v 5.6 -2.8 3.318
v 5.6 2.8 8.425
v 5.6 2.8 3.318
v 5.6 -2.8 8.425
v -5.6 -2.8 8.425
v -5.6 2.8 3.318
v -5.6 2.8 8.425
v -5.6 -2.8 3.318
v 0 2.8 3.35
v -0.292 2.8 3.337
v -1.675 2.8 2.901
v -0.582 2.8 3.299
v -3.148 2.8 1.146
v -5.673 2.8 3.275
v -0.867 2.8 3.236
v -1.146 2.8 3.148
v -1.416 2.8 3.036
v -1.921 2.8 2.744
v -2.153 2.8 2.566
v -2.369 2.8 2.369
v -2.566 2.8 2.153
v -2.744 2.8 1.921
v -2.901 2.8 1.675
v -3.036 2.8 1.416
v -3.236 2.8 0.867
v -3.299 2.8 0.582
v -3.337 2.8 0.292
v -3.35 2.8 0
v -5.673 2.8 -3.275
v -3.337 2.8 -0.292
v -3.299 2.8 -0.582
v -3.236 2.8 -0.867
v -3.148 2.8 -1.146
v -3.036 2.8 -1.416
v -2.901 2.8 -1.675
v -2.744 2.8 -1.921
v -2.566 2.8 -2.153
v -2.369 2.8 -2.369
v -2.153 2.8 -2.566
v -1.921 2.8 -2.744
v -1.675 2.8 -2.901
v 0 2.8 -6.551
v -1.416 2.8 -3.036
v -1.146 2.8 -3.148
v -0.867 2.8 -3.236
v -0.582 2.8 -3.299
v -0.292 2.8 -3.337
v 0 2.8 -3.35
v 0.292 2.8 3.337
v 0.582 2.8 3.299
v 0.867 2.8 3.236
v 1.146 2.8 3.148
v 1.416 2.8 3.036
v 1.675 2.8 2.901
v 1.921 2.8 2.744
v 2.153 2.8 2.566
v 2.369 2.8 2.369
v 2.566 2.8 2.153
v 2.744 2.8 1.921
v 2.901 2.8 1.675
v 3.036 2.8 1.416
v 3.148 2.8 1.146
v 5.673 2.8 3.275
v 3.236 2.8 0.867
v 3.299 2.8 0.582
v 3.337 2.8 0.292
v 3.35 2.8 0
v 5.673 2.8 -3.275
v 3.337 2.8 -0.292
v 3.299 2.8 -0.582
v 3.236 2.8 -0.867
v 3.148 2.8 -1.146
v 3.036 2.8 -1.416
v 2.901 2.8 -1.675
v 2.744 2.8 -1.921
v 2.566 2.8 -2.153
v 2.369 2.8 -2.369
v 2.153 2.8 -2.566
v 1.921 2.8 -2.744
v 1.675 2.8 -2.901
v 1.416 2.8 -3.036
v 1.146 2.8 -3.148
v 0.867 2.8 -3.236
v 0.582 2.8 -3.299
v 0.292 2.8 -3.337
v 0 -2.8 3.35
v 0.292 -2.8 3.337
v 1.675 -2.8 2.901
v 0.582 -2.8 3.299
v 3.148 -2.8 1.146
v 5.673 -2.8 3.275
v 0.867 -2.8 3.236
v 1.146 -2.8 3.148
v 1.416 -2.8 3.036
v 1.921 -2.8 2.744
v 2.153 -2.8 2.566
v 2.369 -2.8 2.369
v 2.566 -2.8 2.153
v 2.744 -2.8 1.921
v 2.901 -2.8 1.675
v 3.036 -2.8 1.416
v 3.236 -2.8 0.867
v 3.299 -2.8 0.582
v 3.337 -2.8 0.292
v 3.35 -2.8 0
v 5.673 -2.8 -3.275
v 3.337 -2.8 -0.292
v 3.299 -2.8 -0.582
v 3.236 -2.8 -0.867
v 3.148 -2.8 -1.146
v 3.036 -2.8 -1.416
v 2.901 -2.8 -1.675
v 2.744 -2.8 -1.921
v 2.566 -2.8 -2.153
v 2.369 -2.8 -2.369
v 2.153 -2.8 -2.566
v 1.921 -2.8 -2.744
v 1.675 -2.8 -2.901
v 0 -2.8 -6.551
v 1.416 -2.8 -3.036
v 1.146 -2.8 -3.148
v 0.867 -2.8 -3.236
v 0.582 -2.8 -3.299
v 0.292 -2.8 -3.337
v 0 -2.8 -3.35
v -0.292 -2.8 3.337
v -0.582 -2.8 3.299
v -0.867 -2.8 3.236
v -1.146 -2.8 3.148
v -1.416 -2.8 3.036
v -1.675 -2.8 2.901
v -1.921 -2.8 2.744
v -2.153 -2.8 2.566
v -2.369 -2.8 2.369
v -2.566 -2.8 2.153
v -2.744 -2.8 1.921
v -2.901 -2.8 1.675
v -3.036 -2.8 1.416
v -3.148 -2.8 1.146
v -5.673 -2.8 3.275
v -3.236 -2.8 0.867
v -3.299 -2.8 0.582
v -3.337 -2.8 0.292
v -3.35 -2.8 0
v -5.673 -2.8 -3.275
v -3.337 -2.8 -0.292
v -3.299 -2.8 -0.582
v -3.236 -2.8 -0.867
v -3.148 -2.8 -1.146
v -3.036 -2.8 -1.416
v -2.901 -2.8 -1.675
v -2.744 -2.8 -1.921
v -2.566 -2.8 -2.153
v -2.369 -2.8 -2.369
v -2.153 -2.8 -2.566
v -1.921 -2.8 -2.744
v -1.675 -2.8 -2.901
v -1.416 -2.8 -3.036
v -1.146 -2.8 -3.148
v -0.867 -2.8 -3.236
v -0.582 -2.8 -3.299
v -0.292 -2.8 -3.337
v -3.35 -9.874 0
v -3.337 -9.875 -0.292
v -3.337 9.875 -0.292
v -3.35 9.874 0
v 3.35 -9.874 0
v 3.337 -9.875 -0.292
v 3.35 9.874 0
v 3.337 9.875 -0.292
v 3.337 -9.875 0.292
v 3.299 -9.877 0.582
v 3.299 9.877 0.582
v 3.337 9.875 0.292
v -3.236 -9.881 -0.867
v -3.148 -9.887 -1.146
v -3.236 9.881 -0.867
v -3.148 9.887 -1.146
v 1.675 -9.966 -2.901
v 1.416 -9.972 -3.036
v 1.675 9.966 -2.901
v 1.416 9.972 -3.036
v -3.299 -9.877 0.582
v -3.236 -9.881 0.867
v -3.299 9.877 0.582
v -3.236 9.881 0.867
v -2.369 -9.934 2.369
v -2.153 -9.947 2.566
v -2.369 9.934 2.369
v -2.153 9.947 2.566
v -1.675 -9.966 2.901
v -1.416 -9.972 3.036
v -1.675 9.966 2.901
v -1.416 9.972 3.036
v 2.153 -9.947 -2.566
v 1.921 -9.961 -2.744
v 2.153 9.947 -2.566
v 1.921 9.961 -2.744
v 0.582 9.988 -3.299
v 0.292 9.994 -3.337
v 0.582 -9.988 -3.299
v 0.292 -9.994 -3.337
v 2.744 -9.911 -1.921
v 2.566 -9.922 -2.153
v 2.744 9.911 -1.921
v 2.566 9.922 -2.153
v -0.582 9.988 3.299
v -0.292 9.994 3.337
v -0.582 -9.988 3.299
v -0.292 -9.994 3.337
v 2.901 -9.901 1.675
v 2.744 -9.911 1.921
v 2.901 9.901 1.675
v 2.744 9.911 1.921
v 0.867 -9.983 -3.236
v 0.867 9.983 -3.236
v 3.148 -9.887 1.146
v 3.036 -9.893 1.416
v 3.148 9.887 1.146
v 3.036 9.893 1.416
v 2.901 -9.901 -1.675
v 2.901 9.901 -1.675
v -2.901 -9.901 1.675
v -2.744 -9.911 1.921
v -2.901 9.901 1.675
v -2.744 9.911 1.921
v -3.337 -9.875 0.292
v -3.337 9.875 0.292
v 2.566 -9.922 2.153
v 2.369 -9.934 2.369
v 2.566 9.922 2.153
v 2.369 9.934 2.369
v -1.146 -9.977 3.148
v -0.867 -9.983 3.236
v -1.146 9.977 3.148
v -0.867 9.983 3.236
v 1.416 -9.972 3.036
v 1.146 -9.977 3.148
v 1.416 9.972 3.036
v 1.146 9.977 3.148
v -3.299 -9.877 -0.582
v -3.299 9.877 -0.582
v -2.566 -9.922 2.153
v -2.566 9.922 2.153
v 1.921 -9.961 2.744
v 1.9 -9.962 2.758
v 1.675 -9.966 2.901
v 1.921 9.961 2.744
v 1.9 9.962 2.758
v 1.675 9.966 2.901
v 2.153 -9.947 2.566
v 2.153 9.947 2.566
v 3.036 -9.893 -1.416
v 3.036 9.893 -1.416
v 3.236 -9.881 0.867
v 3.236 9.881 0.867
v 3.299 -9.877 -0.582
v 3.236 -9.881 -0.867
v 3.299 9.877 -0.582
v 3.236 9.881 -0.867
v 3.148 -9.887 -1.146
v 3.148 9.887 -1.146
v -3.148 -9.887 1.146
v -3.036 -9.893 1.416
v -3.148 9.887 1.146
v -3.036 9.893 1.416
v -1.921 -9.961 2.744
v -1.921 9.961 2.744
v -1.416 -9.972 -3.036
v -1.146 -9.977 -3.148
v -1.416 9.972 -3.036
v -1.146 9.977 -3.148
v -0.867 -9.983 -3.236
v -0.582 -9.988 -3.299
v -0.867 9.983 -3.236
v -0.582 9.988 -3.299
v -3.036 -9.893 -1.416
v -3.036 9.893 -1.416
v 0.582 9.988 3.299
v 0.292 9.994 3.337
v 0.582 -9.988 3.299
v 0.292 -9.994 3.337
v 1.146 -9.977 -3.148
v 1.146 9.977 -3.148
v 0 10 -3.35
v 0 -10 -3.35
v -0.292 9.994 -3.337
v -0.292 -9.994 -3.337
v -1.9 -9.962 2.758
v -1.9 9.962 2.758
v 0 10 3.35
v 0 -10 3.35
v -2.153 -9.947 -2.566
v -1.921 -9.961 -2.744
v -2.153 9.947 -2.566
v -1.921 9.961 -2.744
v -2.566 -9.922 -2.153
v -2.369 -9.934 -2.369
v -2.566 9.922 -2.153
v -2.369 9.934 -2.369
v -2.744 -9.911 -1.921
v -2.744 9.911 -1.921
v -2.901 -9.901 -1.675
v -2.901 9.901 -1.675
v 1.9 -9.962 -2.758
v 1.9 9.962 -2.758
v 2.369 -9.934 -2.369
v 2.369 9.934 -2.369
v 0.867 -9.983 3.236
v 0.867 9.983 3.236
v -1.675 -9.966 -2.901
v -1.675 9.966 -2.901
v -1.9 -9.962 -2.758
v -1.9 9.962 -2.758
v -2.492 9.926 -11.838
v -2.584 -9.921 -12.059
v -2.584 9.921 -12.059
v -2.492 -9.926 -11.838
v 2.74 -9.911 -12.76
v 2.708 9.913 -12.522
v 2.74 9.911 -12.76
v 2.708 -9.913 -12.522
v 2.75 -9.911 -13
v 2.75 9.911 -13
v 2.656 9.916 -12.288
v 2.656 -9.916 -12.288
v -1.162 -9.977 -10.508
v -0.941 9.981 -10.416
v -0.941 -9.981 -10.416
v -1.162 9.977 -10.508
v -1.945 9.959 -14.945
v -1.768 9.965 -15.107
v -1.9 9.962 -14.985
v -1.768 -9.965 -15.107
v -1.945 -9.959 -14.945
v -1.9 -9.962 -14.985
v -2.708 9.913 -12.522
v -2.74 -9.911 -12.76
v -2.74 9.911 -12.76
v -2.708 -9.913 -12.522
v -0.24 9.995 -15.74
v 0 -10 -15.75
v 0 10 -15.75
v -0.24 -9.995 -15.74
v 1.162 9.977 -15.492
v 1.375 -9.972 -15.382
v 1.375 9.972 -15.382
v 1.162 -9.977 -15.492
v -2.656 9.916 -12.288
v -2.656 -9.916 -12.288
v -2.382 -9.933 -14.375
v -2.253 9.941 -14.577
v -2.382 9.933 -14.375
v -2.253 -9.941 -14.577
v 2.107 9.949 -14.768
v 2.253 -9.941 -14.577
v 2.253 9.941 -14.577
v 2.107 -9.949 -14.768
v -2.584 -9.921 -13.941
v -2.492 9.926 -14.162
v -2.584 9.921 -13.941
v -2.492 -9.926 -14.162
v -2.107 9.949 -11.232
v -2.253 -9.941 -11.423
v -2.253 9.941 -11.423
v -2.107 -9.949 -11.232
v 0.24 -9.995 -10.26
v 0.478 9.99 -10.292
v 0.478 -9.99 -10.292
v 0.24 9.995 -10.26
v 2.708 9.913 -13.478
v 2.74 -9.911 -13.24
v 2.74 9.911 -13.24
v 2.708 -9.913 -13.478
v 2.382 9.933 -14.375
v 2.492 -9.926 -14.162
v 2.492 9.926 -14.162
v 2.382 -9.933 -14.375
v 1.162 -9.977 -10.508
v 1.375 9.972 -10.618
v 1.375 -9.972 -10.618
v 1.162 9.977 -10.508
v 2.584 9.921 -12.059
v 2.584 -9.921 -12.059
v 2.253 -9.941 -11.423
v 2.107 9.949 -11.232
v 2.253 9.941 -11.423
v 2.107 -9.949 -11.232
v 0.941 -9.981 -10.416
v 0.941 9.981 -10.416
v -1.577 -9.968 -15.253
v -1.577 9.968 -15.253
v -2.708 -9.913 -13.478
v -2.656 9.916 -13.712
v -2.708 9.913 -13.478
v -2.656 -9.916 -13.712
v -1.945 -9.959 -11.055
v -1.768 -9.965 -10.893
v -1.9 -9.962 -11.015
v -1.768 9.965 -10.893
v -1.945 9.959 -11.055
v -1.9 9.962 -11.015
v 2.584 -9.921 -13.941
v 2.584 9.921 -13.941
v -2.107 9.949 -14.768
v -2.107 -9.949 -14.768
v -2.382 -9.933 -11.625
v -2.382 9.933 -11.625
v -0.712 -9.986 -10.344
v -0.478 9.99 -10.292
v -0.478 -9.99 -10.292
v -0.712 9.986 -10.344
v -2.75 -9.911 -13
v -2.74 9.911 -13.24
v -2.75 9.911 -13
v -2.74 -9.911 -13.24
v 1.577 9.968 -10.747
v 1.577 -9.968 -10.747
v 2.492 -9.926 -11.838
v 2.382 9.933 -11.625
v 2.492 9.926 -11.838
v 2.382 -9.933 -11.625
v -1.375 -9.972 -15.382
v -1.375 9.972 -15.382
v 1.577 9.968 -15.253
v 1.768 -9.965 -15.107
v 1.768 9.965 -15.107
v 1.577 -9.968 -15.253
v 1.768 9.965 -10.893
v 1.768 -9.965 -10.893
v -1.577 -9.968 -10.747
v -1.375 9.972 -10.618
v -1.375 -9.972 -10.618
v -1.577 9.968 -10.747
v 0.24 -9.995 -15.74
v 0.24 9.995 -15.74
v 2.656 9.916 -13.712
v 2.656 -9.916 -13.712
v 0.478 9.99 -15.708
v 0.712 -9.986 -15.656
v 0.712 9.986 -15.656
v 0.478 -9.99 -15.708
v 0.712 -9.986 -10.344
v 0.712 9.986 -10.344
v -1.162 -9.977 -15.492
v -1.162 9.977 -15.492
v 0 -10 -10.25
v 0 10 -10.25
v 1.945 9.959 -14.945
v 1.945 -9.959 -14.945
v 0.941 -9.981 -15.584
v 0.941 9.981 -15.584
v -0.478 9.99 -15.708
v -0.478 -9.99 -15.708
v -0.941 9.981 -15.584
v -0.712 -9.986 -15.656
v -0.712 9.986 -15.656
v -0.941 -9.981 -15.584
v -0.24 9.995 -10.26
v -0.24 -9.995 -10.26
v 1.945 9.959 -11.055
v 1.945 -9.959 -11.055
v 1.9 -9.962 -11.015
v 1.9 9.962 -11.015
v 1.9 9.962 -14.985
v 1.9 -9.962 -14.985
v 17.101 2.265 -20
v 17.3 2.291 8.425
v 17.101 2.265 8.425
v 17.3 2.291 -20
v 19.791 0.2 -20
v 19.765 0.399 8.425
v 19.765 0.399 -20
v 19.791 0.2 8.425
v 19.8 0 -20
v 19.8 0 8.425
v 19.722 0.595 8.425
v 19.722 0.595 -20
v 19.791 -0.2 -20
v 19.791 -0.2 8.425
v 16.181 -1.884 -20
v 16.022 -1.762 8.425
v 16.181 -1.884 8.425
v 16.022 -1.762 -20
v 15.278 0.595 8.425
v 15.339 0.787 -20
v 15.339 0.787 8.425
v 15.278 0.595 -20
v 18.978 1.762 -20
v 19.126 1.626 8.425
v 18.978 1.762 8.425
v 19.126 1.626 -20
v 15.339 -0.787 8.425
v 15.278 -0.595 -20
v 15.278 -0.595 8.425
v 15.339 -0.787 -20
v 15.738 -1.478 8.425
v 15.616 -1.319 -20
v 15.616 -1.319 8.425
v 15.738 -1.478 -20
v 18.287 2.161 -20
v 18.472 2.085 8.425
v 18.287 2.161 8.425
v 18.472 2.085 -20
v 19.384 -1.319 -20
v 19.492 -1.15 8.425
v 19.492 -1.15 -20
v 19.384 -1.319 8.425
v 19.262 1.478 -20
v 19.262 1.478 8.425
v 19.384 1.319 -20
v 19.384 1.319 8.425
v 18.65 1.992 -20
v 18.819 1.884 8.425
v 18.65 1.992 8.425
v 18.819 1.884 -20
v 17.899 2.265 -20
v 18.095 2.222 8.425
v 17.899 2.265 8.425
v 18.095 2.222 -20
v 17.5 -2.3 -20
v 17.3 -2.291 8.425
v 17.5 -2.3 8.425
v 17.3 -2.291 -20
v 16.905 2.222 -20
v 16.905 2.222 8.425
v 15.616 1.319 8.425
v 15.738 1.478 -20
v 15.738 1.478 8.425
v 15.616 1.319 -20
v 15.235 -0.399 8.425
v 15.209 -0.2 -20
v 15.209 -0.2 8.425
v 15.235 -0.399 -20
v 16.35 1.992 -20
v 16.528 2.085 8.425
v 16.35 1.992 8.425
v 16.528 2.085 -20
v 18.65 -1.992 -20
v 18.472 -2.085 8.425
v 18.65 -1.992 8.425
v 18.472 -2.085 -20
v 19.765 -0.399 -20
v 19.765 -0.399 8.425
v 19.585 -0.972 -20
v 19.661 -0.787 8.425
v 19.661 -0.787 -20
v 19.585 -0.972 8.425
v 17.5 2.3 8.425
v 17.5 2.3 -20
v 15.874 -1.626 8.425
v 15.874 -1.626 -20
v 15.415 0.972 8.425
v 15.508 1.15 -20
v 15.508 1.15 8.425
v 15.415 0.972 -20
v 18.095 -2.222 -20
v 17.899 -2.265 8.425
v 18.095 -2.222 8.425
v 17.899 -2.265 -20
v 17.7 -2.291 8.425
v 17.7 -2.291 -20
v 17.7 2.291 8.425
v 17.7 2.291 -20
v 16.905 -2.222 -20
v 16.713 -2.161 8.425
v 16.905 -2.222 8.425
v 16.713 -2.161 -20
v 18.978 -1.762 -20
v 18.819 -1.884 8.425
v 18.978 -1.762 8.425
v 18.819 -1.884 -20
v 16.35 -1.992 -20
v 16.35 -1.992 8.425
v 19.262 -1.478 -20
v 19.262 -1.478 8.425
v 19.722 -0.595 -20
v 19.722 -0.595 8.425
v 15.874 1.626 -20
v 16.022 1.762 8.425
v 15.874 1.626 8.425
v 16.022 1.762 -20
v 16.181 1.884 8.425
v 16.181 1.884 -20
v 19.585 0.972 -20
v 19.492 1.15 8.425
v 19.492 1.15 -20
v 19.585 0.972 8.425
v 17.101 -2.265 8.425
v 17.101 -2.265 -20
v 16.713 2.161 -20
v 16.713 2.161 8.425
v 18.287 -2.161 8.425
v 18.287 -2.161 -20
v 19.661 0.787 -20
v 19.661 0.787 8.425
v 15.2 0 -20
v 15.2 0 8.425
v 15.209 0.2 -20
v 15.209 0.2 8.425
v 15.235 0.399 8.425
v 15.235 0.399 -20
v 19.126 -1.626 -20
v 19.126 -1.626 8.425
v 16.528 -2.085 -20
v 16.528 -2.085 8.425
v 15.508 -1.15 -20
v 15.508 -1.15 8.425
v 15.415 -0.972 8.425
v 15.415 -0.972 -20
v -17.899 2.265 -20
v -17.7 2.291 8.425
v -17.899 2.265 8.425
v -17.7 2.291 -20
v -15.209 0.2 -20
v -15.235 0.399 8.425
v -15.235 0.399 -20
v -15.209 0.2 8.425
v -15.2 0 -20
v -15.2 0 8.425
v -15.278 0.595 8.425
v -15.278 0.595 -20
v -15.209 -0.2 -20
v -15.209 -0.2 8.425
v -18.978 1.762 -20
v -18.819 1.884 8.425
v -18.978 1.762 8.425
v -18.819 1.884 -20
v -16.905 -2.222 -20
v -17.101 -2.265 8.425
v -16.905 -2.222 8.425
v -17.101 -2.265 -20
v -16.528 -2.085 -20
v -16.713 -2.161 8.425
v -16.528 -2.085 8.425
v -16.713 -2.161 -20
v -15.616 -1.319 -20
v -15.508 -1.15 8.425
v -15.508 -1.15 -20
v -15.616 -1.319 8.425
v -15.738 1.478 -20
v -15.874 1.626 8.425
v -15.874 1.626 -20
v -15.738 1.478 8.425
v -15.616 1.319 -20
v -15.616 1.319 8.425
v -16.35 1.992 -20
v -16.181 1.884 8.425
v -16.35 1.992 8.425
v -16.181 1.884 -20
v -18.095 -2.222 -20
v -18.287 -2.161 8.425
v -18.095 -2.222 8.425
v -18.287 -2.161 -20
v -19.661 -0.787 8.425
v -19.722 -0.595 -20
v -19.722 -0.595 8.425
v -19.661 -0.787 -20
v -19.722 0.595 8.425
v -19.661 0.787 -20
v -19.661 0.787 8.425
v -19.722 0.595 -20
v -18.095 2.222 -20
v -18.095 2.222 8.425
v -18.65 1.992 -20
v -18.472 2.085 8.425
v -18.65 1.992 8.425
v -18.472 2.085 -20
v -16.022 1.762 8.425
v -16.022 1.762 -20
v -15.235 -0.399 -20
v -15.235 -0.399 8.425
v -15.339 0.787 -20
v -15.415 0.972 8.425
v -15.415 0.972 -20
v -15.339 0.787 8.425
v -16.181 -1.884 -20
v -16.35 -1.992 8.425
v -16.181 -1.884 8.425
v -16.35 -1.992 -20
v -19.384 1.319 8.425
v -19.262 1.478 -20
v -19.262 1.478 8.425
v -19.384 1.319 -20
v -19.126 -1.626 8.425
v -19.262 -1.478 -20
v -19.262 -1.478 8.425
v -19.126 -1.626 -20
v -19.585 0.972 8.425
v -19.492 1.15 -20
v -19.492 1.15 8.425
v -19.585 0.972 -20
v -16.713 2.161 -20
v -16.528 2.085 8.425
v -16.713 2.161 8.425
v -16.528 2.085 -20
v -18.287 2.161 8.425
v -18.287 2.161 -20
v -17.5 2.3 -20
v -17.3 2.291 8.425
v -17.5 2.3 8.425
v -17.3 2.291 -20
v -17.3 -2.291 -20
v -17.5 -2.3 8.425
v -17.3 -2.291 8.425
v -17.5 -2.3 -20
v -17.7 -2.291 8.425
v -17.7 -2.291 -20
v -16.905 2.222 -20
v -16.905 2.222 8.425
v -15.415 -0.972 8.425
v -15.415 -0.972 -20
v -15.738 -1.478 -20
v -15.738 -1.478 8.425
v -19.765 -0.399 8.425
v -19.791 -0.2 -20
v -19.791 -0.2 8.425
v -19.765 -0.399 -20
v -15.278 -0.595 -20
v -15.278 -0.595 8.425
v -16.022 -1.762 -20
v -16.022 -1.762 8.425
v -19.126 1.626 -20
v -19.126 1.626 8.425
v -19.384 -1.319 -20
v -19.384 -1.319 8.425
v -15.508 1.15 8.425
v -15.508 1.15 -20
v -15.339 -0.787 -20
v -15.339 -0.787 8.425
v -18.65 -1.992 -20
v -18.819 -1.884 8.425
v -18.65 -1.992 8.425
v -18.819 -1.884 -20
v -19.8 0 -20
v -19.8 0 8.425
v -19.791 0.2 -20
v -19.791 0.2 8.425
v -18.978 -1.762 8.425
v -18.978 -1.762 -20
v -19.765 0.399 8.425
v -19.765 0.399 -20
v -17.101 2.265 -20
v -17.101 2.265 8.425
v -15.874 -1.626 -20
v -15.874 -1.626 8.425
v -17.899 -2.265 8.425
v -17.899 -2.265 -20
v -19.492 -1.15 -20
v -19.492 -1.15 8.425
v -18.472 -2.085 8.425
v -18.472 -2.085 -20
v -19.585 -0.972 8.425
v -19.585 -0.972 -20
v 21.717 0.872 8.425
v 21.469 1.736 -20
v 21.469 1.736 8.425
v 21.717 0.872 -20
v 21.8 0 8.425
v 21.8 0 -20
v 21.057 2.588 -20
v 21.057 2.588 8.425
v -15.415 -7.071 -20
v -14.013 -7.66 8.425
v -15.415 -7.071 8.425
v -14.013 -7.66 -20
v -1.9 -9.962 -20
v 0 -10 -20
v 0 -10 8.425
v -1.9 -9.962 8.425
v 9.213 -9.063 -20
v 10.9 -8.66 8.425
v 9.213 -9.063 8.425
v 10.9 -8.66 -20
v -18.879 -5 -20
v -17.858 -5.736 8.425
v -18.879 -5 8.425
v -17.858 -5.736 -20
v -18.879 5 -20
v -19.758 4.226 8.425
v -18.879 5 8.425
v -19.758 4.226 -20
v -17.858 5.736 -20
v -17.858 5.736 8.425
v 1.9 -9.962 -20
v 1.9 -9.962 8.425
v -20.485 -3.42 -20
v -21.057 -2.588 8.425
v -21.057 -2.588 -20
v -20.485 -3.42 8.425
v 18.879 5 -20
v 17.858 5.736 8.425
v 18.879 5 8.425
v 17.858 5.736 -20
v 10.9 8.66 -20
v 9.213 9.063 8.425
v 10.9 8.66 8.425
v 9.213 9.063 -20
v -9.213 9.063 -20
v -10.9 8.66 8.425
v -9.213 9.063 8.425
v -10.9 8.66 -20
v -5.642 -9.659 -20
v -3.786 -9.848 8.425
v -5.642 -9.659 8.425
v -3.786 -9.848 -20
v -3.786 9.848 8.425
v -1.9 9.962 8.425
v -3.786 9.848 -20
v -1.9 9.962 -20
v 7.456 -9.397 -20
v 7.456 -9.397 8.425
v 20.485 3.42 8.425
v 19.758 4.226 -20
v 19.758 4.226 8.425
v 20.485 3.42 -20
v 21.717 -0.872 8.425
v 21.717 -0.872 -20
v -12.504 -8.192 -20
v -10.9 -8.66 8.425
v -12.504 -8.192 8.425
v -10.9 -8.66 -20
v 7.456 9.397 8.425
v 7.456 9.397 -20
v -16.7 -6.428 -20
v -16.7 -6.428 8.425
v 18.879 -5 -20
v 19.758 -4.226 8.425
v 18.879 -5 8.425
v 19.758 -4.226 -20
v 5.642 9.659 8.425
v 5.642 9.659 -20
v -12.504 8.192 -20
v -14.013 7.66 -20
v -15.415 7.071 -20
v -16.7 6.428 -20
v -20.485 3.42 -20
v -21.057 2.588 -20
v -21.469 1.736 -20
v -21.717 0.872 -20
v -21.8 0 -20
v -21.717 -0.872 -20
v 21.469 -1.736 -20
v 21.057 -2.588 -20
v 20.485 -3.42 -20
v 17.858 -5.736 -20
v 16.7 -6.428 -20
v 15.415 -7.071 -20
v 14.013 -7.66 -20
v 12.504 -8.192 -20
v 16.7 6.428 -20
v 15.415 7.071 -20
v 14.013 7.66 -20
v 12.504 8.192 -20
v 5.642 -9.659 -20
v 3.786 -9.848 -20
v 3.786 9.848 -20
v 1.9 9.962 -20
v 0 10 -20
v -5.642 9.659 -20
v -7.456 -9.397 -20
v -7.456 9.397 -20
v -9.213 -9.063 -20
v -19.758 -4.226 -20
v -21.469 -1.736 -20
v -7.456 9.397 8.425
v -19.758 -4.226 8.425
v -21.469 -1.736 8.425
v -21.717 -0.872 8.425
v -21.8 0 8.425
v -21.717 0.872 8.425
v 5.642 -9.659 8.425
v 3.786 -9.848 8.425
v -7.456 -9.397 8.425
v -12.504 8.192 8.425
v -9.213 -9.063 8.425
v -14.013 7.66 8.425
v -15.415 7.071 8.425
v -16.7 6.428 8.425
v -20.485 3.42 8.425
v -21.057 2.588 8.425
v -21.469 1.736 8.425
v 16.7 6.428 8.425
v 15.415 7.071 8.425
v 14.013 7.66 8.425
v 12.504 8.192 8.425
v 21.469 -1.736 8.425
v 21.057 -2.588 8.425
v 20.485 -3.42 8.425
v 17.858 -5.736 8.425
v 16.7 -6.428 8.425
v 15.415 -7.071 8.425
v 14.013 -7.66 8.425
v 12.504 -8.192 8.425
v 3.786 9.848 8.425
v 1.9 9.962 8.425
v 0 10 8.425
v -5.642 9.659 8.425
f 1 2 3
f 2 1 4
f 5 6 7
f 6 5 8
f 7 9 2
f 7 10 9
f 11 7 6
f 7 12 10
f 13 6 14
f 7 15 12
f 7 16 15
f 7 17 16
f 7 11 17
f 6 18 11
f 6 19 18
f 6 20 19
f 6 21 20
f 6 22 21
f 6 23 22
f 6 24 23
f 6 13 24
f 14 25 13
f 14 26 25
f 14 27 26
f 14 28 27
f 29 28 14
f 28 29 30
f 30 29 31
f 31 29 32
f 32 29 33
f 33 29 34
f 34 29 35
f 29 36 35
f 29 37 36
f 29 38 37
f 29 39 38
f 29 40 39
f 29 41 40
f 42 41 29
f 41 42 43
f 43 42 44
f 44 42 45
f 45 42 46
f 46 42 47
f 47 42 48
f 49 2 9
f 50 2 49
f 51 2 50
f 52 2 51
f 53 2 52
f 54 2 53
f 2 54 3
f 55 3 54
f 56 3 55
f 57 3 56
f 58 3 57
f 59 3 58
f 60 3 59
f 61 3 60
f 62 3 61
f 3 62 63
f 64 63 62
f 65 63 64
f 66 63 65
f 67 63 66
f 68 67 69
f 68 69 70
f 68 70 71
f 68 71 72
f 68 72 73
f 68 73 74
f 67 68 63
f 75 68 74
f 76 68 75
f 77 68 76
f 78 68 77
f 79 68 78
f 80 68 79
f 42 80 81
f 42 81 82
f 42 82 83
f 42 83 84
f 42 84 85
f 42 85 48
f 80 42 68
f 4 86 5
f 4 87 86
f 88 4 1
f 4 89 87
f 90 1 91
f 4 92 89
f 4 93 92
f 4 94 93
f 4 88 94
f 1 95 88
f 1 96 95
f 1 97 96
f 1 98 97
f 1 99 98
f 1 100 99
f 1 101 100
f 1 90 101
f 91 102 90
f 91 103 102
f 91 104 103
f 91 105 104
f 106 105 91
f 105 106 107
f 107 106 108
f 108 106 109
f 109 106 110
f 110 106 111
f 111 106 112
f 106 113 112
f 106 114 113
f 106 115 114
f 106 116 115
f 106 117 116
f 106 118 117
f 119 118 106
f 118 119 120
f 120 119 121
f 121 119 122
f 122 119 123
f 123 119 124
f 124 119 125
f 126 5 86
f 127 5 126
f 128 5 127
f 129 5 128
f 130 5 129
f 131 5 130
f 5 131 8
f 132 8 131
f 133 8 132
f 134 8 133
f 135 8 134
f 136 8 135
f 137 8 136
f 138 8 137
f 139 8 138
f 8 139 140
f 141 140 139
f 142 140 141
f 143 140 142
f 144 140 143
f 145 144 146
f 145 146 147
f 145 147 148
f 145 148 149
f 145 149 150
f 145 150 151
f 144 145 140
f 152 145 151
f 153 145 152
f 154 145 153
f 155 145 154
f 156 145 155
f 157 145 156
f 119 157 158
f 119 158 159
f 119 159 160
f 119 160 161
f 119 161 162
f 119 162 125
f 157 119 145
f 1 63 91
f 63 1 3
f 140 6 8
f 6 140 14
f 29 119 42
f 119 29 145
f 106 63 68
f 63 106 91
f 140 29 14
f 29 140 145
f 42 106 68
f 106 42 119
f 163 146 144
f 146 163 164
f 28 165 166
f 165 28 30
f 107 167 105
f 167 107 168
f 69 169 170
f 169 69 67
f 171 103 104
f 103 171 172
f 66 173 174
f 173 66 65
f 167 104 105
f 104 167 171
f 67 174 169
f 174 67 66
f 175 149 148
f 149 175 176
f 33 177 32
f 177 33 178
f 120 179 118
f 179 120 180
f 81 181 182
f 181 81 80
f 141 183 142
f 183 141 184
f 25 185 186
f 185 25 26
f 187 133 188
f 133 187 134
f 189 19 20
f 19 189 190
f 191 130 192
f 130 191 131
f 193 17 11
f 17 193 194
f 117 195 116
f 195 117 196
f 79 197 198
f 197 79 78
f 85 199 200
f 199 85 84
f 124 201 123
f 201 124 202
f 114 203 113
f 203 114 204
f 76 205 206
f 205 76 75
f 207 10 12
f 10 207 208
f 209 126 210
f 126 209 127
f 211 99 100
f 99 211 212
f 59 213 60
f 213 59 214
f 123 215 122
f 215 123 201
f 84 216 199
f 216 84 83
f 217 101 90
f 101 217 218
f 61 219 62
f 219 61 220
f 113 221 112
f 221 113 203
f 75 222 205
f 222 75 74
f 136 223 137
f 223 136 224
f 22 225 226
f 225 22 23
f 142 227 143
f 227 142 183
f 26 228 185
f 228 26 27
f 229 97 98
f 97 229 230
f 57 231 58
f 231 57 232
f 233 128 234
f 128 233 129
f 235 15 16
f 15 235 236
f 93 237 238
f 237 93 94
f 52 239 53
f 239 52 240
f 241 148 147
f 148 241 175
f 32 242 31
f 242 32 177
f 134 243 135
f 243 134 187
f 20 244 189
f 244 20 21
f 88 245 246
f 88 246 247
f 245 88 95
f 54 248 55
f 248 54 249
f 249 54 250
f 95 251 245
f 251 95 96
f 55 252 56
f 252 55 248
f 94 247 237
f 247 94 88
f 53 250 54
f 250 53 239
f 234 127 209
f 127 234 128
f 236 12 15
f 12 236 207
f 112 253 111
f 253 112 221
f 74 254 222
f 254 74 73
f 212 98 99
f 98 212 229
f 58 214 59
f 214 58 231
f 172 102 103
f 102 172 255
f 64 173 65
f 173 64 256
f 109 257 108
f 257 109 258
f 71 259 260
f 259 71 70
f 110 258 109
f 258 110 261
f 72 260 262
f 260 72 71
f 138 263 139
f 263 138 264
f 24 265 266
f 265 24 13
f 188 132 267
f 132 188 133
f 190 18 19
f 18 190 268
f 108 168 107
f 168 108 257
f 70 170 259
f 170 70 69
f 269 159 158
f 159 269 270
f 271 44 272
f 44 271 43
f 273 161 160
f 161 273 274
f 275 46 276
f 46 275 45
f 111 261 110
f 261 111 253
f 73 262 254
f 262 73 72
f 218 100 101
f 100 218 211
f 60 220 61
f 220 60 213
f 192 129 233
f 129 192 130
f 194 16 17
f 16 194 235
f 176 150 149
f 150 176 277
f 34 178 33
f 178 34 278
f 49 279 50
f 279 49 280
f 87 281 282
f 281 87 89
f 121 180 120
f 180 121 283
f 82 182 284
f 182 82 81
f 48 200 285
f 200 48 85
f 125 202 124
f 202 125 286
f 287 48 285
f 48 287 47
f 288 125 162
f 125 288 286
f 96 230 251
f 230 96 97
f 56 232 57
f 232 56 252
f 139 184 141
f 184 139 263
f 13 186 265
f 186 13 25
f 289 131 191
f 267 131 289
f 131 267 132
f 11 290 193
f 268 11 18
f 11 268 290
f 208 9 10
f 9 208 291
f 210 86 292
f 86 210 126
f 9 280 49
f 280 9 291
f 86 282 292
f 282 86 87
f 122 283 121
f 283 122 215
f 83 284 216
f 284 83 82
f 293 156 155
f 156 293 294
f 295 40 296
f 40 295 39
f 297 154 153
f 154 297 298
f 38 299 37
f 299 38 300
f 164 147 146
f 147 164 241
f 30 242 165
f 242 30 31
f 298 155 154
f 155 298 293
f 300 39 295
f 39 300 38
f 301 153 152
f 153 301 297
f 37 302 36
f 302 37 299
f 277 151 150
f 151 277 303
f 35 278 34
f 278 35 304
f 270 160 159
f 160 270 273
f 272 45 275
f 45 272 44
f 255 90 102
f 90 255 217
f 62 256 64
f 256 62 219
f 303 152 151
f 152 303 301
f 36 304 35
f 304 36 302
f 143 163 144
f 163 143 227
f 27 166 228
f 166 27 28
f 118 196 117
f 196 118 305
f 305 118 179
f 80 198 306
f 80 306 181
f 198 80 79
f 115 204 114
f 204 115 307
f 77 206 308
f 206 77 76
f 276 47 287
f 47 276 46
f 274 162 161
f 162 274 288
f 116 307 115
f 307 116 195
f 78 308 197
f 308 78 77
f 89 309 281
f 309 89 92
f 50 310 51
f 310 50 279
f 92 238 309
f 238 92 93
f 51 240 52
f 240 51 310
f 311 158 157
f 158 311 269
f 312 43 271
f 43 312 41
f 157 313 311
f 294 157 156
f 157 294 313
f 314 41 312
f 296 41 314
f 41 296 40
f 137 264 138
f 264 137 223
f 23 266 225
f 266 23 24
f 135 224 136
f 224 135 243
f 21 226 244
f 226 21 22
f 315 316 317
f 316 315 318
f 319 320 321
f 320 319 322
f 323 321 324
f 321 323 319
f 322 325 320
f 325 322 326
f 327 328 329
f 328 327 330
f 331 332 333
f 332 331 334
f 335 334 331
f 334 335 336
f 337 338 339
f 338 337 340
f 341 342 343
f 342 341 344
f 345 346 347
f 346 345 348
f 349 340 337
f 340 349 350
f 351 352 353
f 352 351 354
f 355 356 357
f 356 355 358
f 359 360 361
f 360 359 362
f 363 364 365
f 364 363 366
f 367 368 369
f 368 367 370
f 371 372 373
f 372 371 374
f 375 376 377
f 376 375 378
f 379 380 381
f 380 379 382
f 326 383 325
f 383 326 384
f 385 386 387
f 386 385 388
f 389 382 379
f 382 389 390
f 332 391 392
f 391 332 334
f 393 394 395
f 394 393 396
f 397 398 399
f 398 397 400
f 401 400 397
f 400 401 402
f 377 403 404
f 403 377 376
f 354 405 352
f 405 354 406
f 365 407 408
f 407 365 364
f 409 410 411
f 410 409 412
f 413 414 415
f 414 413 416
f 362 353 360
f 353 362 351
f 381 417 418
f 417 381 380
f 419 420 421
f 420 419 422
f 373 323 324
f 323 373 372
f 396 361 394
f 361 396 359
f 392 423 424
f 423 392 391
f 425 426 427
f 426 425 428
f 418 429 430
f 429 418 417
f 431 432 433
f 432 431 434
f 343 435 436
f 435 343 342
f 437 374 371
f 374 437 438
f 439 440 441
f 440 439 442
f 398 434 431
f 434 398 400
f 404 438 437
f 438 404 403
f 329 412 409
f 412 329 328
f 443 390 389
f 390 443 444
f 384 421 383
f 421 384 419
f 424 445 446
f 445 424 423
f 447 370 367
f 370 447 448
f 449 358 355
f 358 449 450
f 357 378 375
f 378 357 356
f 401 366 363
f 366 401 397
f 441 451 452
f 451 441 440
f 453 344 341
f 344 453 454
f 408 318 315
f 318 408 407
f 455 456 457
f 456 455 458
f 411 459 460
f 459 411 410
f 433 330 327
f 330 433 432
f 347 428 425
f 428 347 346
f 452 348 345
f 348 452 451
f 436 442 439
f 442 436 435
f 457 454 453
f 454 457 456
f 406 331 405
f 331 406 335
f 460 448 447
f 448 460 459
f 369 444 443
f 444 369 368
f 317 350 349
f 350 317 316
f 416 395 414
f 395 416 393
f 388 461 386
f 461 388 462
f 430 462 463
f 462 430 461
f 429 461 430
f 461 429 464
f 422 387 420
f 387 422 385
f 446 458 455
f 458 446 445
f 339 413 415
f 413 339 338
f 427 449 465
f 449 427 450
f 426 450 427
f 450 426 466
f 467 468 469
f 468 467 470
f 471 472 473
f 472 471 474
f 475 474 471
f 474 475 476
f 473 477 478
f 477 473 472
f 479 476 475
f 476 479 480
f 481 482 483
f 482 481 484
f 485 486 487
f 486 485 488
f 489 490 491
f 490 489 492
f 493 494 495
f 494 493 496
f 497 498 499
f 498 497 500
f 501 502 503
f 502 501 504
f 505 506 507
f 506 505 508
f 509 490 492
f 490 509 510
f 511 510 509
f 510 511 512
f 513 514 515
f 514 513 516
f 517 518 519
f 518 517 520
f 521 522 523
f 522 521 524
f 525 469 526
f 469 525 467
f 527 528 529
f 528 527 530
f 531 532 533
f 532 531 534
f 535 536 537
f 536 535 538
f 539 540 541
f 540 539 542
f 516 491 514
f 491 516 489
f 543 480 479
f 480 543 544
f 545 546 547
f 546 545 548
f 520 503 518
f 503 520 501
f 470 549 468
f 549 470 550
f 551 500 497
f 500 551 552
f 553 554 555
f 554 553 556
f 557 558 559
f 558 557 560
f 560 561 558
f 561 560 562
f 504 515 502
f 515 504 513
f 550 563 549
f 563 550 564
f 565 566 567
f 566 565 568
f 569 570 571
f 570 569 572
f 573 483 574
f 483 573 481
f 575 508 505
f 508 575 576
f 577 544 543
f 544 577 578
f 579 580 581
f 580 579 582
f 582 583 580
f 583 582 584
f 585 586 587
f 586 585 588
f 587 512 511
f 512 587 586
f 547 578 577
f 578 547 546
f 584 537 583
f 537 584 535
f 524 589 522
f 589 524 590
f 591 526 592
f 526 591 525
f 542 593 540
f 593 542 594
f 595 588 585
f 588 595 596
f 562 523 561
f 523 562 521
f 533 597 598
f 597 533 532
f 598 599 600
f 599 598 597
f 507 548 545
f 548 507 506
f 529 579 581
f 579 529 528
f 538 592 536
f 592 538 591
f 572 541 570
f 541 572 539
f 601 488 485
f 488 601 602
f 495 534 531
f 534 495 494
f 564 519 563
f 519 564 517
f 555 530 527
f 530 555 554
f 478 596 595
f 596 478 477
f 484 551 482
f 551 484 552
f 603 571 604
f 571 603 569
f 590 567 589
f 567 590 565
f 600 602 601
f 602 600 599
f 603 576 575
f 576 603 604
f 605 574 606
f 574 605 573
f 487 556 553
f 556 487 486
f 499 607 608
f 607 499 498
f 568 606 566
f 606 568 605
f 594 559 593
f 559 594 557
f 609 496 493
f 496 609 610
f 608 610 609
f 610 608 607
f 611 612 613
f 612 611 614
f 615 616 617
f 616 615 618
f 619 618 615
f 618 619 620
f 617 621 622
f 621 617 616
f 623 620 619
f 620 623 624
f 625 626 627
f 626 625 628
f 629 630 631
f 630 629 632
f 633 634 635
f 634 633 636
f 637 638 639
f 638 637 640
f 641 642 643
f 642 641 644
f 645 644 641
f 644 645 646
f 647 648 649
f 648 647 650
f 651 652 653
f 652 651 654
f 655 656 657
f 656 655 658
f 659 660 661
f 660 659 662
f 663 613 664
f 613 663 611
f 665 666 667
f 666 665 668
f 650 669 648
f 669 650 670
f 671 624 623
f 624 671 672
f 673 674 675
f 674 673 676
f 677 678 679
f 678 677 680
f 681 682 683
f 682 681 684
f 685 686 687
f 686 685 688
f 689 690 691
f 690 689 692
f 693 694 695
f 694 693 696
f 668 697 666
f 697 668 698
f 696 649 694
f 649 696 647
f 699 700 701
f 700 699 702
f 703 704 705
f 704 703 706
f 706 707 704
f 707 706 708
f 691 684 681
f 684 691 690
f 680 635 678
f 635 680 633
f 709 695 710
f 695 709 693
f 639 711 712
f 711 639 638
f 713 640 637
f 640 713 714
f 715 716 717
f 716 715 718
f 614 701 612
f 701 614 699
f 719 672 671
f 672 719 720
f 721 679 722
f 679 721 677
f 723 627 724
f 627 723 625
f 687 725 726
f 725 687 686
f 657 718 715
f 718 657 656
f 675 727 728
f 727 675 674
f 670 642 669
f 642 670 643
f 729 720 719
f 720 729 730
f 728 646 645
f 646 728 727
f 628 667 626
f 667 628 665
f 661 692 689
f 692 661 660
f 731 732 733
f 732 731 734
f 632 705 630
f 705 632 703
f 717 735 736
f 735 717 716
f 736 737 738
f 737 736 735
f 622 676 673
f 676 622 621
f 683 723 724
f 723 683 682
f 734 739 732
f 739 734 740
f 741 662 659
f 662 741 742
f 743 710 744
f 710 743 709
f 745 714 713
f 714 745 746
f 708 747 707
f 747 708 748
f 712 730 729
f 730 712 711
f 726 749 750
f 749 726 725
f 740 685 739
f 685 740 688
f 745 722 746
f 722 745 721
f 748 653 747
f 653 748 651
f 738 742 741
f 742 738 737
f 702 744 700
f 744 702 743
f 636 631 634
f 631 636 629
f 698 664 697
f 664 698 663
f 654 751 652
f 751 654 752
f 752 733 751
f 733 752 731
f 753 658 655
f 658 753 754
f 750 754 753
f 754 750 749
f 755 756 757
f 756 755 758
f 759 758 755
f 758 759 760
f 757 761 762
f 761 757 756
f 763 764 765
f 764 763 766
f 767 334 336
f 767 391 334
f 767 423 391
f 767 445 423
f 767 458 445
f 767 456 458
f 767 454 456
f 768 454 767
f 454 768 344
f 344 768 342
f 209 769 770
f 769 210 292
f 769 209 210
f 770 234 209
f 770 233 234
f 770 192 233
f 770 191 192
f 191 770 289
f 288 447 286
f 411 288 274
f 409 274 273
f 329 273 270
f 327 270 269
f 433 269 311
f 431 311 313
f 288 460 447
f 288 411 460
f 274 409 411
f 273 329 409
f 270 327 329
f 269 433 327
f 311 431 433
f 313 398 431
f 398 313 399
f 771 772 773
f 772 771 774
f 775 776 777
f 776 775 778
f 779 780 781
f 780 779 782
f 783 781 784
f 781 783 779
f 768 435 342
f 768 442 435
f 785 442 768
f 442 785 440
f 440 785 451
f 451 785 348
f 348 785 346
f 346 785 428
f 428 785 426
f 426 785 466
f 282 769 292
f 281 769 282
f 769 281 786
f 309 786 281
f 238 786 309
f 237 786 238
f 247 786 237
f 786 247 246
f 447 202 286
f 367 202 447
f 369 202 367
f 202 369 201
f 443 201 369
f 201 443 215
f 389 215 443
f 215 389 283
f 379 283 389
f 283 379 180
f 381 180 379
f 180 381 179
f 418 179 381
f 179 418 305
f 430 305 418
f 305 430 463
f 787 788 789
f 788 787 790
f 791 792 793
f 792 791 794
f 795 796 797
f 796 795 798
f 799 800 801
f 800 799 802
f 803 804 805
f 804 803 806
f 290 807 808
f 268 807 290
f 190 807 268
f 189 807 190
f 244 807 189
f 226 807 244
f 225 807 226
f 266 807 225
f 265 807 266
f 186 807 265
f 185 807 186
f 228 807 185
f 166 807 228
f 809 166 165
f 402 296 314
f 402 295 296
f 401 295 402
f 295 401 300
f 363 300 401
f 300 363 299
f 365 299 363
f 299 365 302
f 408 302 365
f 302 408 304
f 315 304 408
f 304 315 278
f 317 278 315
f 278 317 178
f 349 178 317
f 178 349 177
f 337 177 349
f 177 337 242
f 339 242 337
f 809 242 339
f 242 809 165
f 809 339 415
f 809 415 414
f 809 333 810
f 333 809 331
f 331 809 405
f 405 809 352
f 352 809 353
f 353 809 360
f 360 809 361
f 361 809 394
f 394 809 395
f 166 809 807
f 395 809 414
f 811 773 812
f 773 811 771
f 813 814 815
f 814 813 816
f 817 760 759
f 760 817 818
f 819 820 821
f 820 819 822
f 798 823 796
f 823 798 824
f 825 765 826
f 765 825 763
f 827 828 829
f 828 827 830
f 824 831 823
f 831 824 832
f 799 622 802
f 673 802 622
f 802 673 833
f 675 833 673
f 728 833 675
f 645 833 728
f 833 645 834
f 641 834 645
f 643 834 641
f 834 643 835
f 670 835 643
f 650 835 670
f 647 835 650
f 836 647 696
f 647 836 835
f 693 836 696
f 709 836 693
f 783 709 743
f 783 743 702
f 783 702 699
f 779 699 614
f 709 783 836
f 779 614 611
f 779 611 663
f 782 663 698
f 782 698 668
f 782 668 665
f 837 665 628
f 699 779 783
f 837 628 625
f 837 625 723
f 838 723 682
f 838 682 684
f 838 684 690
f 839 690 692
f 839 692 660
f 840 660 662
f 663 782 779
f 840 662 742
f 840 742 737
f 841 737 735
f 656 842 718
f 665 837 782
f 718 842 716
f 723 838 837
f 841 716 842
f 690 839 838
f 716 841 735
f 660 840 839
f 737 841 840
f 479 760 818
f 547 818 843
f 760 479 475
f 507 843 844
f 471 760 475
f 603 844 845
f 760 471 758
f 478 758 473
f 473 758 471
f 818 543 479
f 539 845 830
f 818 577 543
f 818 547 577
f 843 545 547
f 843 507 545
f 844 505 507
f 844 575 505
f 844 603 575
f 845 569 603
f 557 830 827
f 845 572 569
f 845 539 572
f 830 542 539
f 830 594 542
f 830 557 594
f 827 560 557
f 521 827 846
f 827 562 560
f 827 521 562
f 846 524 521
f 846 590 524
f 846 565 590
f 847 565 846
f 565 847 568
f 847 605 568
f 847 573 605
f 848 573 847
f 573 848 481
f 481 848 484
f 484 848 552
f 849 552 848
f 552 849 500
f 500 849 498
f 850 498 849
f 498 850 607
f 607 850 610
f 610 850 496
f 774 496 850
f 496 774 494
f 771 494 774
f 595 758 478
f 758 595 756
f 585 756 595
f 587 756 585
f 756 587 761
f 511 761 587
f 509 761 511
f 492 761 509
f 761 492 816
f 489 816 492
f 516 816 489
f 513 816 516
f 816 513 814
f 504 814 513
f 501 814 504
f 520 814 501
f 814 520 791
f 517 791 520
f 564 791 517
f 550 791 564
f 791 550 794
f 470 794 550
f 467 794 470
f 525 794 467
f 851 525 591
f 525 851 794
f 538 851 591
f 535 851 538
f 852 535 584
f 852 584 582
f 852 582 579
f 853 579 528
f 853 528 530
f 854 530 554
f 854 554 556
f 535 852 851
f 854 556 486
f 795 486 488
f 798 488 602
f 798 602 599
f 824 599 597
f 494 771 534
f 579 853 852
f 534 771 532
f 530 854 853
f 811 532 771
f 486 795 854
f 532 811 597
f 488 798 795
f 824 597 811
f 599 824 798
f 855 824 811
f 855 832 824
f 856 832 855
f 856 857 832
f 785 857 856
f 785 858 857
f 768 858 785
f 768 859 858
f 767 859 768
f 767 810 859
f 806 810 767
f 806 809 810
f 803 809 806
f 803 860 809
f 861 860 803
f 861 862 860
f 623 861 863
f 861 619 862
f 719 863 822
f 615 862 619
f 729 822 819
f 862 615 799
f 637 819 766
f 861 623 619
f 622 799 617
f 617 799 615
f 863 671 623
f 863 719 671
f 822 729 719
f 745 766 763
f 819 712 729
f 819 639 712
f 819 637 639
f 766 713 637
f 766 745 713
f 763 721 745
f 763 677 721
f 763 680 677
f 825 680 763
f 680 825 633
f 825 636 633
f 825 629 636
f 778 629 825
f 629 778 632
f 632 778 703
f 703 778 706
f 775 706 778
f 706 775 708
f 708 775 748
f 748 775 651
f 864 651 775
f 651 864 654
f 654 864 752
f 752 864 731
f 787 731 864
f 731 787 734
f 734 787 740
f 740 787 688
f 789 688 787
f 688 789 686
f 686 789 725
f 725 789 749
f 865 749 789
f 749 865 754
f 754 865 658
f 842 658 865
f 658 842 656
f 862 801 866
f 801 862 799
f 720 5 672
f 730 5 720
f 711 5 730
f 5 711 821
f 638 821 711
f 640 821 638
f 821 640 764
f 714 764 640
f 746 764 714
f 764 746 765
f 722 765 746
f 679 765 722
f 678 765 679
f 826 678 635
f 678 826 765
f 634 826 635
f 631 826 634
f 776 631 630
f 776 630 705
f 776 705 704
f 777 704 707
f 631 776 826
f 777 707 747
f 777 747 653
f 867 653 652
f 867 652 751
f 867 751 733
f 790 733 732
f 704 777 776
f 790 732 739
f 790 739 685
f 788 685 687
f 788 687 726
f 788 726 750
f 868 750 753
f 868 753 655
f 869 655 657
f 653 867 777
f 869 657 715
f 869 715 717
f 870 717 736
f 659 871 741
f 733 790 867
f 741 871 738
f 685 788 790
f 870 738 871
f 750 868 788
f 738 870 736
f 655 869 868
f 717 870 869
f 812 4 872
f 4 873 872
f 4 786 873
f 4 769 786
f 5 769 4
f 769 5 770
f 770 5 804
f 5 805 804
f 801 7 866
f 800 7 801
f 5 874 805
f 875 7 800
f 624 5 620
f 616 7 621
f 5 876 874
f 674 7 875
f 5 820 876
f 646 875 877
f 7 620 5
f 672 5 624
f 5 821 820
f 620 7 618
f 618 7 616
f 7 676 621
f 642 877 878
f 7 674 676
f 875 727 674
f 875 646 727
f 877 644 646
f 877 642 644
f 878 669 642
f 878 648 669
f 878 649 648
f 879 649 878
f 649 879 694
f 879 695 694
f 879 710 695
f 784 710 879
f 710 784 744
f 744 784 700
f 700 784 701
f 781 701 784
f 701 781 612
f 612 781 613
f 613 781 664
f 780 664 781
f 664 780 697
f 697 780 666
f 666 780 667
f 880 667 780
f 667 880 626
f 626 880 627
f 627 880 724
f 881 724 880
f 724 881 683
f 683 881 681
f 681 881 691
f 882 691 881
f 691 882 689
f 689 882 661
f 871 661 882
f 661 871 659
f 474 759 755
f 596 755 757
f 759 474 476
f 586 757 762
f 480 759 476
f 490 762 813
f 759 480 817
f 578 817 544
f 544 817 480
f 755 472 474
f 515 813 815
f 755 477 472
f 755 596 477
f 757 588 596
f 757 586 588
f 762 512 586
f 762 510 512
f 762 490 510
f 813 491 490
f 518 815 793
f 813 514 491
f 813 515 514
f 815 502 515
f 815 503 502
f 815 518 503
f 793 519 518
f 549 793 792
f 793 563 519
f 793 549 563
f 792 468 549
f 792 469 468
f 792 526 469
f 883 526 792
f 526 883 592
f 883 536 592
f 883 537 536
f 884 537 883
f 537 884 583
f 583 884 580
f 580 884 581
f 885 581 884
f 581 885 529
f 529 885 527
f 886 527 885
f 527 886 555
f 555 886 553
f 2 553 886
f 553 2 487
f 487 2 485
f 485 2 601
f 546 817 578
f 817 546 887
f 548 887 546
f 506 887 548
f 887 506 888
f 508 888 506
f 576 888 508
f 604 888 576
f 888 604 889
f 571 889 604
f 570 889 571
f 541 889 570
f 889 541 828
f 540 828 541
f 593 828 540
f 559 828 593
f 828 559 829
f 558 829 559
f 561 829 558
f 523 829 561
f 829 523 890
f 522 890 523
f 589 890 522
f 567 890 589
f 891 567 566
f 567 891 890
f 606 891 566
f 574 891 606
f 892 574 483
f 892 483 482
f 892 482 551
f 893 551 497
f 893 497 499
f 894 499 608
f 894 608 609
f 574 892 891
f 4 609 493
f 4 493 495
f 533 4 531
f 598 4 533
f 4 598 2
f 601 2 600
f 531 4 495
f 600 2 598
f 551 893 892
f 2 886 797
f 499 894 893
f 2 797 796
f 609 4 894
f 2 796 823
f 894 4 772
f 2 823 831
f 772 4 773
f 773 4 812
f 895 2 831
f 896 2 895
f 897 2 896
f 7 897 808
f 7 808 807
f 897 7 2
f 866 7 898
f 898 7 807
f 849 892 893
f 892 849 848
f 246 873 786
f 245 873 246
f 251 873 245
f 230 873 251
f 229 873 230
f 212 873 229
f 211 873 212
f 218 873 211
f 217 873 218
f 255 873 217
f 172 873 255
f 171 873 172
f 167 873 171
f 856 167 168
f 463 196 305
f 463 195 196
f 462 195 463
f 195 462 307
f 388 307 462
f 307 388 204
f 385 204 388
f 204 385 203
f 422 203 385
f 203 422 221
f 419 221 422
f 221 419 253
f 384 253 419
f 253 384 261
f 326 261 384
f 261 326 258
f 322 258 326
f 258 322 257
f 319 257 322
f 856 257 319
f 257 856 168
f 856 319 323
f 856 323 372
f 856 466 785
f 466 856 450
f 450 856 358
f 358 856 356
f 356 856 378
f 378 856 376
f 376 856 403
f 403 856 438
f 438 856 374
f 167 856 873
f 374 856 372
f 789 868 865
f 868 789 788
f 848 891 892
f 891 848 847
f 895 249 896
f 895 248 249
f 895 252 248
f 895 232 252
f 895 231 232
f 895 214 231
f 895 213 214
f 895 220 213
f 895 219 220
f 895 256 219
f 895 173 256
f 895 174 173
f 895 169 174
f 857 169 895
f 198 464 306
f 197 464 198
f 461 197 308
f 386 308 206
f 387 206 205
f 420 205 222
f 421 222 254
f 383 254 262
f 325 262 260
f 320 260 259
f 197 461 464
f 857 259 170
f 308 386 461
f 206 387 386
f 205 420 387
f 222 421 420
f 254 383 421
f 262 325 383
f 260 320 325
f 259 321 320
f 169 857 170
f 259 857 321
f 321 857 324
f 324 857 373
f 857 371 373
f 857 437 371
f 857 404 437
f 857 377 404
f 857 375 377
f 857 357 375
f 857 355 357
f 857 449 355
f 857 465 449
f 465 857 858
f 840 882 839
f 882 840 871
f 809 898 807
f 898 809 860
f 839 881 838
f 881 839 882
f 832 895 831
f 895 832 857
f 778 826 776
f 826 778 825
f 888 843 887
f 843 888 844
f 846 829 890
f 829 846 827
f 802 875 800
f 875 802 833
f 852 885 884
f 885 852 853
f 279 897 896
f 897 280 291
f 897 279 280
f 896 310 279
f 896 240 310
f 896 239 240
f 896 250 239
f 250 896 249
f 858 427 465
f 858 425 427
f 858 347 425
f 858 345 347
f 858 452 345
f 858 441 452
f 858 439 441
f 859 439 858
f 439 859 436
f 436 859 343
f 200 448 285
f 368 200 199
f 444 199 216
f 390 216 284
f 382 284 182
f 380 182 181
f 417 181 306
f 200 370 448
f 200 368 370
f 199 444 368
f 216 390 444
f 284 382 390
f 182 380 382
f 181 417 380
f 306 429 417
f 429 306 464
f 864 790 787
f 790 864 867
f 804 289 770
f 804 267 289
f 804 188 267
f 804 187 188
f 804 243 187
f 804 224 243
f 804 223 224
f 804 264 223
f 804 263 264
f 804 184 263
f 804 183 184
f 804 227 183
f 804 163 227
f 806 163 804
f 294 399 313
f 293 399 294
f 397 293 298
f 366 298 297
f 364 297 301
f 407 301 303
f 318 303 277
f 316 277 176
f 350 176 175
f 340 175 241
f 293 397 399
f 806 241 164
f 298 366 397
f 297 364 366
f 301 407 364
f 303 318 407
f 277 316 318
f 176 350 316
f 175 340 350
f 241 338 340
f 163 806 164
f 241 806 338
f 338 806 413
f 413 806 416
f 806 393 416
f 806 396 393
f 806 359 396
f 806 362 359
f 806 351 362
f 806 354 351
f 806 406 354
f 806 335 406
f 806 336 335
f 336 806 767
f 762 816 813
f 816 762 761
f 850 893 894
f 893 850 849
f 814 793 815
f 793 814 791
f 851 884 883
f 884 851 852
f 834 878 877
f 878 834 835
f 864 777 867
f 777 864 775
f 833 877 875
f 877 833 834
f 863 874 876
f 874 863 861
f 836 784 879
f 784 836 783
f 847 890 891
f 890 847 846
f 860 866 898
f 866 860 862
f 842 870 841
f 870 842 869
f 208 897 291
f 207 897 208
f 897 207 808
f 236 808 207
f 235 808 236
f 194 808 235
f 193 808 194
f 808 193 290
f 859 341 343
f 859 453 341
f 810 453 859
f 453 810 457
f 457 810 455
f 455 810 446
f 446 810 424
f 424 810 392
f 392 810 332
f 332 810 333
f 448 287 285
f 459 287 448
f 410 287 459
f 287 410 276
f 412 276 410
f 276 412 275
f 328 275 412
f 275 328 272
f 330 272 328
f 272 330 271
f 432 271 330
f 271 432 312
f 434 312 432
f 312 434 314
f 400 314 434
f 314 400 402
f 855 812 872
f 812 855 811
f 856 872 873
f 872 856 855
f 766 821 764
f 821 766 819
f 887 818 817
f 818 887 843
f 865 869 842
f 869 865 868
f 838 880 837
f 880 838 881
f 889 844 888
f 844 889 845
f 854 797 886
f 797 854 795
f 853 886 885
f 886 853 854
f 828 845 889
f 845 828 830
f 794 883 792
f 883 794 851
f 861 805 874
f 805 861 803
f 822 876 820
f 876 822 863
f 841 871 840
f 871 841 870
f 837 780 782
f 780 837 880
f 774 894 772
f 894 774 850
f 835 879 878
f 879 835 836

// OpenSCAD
Gap = 0.2;
$fn = 72;

translate([10,40,0])
    Helper(false, hide=true)
        RodToBearingCoupling();

translate([-10,40,0])
    Helper(false, hide=true)
        RodToMotorCoupling();
    
intersection() {
    Helper(false)
        Guide();
}

translate([0,-40,0])
    Helper(false, hide=true)
        RodConnect();

// If debug is set, renders a cross section of the object
module Helper(debug, hide = false) {
    if (!hide)
    {
        if (debug) {
            intersection() {
                children();
                translate([0,-100,-100])
                    cube([200,200,200]);
            }
        } else {
            children();
        }
    }
}

module RodConnect() {
    RodThickness = 2.0;
    RodDepth = 13.4;
    
    BearingDiameter = 7.9;
    BearingLength = 15;
    
    ConnectorShift = 0.5;
    
    ConnectorWidth = RodThickness+23;
    ConnectorDepth = RodDepth+10;
    
    CornerRadius = 5;
    
    intersection() {
        translate([0,0,ConnectorShift])
            cube([200,200,BearingDiameter - 2 * ConnectorShift], center=true);
        difference() {
            union () {
                rotate([0,-90,0])
                    cylinder(r = BearingDiameter/2, h = BearingLength);
                
                rotate([0,-90,0])
                    cylinder(r1 = BearingDiameter/2+5, r2 = BearingDiameter/2,
                             h = 5);
                
                linear_extrude(height=BearingDiameter, center=true)
                    offset(r=CornerRadius)
                        polygon([[CornerRadius, -ConnectorWidth/2 + CornerRadius],
                                 [ConnectorDepth - CornerRadius,
                                  -ConnectorWidth/2 + CornerRadius],
                                 [ConnectorDepth - CornerRadius,
                                  ConnectorWidth/2 - CornerRadius],
                                 [CornerRadius,
                                  ConnectorWidth/2 - CornerRadius]]);
            }
            
            union () {
                rotate([0,0,2])
                    translate([ConnectorDepth/2,0,0])
                        cube([RodDepth, RodThickness, 100], center = true);
            }
        }
    }    
}

module Guide() {
    Thickness = 28.425;
    Depth = 20;

    HexFlatDiameter = 11.0;
    HexRadius = HexFlatDiameter/(2 * cos(30));
    HexThickness = 5.4;

    MountOffset = 20;
    GuideRodDiameter = 5.5;
    GuideRodOffet = 13;
    ThreadRodDiameter = 6.7;
    
    BoltDiameter = 4.6;
    BoltSeparation = 35.0;
    
    Width = BoltSeparation + BoltDiameter + 4;

    
    difference() {
        translate([0,0,-MountOffset])
            scale([Width/2, Depth/2, 1])
                cylinder(r = 1, h = Thickness);
        
        union () {
            translate([0,0,50])
                cube([HexFlatDiameter+Gap, HexThickness+Gap, 100], center=true);
            
            rotate([90,30,0])
            cylinder(r = HexRadius+Gap, h=HexThickness+Gap, center=true, $fn = 6);
            
            rotate([90,0,0])
                cylinder(r=ThreadRodDiameter/2, h = 100, center=true);
            
            translate([0,0,-GuideRodOffet])
                rotate([90,0,0])
                    cylinder(r=GuideRodDiameter/2, h = 100, center = true);
            
            translate([BoltSeparation/2,0,0])
                cylinder(r=BoltDiameter/2, h=100, center=true);
            translate([-BoltSeparation/2,0,0])
                cylinder(r=BoltDiameter/2, h=100, center=true);
        }
    }
       
}

module RodToMotorCoupling() {
    BearingDiameter = 20.0;
    BearingHeight = 14.0;
        
    HexFlatDiameter = 11.0;
    HexRadius = HexFlatDiameter/(2 * cos(30));
    HexHeight = 8;
    
    ShaftDiameter = 8.2;
    SocketThickness = 3.0;
    ShaftHeight = 35.0;

    GuideHeight = 6.0;
    GuideDiameter = 2.8;
    
    ShaftRadius = ShaftDiameter / 2;
    SocketRadius = ShaftRadius + SocketThickness;
    SocketDiameter = SocketRadius * 2;
    BearingRadius = BearingDiameter / 2;
    MiddleHeight = BearingRadius - SocketRadius; // ensure angle of 45 degrees on the outer wall
    GuideRadius = GuideDiameter / 2;
    MiddleInnerHeight = ShaftRadius + Gap; // ensure angle of 45 degrees on the inner wall

    union () {
        // Part which wraps around the motor
        difference() {
            cylinder(r=SocketRadius, h = ShaftHeight + MiddleInnerHeight);

            translate([0,SocketRadius,GuideHeight])
                rotate([90,0,0])
                    cylinder(r=GuideRadius + Gap, h = SocketDiameter);

            translate([0,0,-1]) // -1 to Ensure the difference
                union()
                {
                    cylinder(r=ShaftRadius + Gap, h = ShaftHeight+1);
                    translate([0,0,ShaftHeight + 1])
                        cylinder(r1=ShaftRadius + Gap, r2= 0, h = MiddleInnerHeight);
                }
        }

        // Connect to the other part
        translate([0,0,ShaftHeight + MiddleInnerHeight])
            cylinder(r1=SocketRadius, r2= BearingRadius  - Gap, h = MiddleHeight);
        
        // Fit in the bearing
        translate([0,0, ShaftHeight + MiddleInnerHeight + MiddleHeight])
            difference() {
                cylinder(r=BearingRadius - Gap, h = BearingHeight);

                translate([0,0,0])
                    cylinder(r = HexRadius + Gap, h = BearingHeight + 1, $fn = 6);
            }
    }
}

module RodToBearingCoupling() {
    CouplingDiameter = 10;
    BearingDiameter = 7.5;
    BearingHeight = 12;
    MiddleThickness = (CouplingDiameter - BearingDiameter) / 2; // Keep slope at 45 degrees
    RodHeight = 5;
    RodDiameter = 6.5;
    ConeHeight = RodDiameter / 2; // Keep slope at 45 degrees
    RimHeight = 1;
    RimDiameter = 7;
    TighteningRadius = 1.5;
    TighteningHeight = 2.5;
    TighteningDepth = 1;

    rotate([180,0,0])
    {
        difference() {
            // Body
            union () {
                cylinder(r=BearingDiameter / 2, h = BearingHeight);
                
                translate([0,0,BearingHeight - ConeHeight])
                    cylinder(r1=BearingDiameter / 2, r2=CouplingDiameter / 2, h = ConeHeight);

                translate([0,0,BearingHeight])
                    cylinder(r=CouplingDiameter / 2, h = RodHeight + RimHeight);
            }
            // Space for threaded rod
            union () {
                translate([0,0,BearingHeight - ConeHeight])
                    cylinder(r=0, r2=RodDiameter/2, h = ConeHeight);

                translate([0,0,BearingHeight])
                    cylinder(r=RodDiameter/2, h = RodHeight);

                translate([0,0,BearingHeight+RodHeight])
                    cylinder(r=RodDiameter/2, r2=RimDiameter/2, h = RimHeight);
            }
            // Dimple for the tightening screw
            translate([0,BearingDiameter/2, TighteningHeight])
                rotate([90,0,0])
                    cylinder(r=TighteningRadius + Gap, r2=0, h = TighteningDepth);
        }
    }
}

// Rod: https://www.homedepot.com/p/Everbilt-1-2-in-x-36-in-Aluminum-Flat-Bar-800217/204604762
// Rod connect Bearing: https://www.amazon.com/gp/product/B00N4138LU/ref=ppx_yo_dt_b_search_asin_title?ie=UTF8&psc=1
// Motor coupling bearing https://www.amazon.com/uxcell-KFL002-Aligning-Pillow-Bearing/dp/B073KTGZ1H/ref=sr_1_20?keywords=uxcell%2Bflange%2Bbearing&qid=1576645950&sr=8-20&th=1
